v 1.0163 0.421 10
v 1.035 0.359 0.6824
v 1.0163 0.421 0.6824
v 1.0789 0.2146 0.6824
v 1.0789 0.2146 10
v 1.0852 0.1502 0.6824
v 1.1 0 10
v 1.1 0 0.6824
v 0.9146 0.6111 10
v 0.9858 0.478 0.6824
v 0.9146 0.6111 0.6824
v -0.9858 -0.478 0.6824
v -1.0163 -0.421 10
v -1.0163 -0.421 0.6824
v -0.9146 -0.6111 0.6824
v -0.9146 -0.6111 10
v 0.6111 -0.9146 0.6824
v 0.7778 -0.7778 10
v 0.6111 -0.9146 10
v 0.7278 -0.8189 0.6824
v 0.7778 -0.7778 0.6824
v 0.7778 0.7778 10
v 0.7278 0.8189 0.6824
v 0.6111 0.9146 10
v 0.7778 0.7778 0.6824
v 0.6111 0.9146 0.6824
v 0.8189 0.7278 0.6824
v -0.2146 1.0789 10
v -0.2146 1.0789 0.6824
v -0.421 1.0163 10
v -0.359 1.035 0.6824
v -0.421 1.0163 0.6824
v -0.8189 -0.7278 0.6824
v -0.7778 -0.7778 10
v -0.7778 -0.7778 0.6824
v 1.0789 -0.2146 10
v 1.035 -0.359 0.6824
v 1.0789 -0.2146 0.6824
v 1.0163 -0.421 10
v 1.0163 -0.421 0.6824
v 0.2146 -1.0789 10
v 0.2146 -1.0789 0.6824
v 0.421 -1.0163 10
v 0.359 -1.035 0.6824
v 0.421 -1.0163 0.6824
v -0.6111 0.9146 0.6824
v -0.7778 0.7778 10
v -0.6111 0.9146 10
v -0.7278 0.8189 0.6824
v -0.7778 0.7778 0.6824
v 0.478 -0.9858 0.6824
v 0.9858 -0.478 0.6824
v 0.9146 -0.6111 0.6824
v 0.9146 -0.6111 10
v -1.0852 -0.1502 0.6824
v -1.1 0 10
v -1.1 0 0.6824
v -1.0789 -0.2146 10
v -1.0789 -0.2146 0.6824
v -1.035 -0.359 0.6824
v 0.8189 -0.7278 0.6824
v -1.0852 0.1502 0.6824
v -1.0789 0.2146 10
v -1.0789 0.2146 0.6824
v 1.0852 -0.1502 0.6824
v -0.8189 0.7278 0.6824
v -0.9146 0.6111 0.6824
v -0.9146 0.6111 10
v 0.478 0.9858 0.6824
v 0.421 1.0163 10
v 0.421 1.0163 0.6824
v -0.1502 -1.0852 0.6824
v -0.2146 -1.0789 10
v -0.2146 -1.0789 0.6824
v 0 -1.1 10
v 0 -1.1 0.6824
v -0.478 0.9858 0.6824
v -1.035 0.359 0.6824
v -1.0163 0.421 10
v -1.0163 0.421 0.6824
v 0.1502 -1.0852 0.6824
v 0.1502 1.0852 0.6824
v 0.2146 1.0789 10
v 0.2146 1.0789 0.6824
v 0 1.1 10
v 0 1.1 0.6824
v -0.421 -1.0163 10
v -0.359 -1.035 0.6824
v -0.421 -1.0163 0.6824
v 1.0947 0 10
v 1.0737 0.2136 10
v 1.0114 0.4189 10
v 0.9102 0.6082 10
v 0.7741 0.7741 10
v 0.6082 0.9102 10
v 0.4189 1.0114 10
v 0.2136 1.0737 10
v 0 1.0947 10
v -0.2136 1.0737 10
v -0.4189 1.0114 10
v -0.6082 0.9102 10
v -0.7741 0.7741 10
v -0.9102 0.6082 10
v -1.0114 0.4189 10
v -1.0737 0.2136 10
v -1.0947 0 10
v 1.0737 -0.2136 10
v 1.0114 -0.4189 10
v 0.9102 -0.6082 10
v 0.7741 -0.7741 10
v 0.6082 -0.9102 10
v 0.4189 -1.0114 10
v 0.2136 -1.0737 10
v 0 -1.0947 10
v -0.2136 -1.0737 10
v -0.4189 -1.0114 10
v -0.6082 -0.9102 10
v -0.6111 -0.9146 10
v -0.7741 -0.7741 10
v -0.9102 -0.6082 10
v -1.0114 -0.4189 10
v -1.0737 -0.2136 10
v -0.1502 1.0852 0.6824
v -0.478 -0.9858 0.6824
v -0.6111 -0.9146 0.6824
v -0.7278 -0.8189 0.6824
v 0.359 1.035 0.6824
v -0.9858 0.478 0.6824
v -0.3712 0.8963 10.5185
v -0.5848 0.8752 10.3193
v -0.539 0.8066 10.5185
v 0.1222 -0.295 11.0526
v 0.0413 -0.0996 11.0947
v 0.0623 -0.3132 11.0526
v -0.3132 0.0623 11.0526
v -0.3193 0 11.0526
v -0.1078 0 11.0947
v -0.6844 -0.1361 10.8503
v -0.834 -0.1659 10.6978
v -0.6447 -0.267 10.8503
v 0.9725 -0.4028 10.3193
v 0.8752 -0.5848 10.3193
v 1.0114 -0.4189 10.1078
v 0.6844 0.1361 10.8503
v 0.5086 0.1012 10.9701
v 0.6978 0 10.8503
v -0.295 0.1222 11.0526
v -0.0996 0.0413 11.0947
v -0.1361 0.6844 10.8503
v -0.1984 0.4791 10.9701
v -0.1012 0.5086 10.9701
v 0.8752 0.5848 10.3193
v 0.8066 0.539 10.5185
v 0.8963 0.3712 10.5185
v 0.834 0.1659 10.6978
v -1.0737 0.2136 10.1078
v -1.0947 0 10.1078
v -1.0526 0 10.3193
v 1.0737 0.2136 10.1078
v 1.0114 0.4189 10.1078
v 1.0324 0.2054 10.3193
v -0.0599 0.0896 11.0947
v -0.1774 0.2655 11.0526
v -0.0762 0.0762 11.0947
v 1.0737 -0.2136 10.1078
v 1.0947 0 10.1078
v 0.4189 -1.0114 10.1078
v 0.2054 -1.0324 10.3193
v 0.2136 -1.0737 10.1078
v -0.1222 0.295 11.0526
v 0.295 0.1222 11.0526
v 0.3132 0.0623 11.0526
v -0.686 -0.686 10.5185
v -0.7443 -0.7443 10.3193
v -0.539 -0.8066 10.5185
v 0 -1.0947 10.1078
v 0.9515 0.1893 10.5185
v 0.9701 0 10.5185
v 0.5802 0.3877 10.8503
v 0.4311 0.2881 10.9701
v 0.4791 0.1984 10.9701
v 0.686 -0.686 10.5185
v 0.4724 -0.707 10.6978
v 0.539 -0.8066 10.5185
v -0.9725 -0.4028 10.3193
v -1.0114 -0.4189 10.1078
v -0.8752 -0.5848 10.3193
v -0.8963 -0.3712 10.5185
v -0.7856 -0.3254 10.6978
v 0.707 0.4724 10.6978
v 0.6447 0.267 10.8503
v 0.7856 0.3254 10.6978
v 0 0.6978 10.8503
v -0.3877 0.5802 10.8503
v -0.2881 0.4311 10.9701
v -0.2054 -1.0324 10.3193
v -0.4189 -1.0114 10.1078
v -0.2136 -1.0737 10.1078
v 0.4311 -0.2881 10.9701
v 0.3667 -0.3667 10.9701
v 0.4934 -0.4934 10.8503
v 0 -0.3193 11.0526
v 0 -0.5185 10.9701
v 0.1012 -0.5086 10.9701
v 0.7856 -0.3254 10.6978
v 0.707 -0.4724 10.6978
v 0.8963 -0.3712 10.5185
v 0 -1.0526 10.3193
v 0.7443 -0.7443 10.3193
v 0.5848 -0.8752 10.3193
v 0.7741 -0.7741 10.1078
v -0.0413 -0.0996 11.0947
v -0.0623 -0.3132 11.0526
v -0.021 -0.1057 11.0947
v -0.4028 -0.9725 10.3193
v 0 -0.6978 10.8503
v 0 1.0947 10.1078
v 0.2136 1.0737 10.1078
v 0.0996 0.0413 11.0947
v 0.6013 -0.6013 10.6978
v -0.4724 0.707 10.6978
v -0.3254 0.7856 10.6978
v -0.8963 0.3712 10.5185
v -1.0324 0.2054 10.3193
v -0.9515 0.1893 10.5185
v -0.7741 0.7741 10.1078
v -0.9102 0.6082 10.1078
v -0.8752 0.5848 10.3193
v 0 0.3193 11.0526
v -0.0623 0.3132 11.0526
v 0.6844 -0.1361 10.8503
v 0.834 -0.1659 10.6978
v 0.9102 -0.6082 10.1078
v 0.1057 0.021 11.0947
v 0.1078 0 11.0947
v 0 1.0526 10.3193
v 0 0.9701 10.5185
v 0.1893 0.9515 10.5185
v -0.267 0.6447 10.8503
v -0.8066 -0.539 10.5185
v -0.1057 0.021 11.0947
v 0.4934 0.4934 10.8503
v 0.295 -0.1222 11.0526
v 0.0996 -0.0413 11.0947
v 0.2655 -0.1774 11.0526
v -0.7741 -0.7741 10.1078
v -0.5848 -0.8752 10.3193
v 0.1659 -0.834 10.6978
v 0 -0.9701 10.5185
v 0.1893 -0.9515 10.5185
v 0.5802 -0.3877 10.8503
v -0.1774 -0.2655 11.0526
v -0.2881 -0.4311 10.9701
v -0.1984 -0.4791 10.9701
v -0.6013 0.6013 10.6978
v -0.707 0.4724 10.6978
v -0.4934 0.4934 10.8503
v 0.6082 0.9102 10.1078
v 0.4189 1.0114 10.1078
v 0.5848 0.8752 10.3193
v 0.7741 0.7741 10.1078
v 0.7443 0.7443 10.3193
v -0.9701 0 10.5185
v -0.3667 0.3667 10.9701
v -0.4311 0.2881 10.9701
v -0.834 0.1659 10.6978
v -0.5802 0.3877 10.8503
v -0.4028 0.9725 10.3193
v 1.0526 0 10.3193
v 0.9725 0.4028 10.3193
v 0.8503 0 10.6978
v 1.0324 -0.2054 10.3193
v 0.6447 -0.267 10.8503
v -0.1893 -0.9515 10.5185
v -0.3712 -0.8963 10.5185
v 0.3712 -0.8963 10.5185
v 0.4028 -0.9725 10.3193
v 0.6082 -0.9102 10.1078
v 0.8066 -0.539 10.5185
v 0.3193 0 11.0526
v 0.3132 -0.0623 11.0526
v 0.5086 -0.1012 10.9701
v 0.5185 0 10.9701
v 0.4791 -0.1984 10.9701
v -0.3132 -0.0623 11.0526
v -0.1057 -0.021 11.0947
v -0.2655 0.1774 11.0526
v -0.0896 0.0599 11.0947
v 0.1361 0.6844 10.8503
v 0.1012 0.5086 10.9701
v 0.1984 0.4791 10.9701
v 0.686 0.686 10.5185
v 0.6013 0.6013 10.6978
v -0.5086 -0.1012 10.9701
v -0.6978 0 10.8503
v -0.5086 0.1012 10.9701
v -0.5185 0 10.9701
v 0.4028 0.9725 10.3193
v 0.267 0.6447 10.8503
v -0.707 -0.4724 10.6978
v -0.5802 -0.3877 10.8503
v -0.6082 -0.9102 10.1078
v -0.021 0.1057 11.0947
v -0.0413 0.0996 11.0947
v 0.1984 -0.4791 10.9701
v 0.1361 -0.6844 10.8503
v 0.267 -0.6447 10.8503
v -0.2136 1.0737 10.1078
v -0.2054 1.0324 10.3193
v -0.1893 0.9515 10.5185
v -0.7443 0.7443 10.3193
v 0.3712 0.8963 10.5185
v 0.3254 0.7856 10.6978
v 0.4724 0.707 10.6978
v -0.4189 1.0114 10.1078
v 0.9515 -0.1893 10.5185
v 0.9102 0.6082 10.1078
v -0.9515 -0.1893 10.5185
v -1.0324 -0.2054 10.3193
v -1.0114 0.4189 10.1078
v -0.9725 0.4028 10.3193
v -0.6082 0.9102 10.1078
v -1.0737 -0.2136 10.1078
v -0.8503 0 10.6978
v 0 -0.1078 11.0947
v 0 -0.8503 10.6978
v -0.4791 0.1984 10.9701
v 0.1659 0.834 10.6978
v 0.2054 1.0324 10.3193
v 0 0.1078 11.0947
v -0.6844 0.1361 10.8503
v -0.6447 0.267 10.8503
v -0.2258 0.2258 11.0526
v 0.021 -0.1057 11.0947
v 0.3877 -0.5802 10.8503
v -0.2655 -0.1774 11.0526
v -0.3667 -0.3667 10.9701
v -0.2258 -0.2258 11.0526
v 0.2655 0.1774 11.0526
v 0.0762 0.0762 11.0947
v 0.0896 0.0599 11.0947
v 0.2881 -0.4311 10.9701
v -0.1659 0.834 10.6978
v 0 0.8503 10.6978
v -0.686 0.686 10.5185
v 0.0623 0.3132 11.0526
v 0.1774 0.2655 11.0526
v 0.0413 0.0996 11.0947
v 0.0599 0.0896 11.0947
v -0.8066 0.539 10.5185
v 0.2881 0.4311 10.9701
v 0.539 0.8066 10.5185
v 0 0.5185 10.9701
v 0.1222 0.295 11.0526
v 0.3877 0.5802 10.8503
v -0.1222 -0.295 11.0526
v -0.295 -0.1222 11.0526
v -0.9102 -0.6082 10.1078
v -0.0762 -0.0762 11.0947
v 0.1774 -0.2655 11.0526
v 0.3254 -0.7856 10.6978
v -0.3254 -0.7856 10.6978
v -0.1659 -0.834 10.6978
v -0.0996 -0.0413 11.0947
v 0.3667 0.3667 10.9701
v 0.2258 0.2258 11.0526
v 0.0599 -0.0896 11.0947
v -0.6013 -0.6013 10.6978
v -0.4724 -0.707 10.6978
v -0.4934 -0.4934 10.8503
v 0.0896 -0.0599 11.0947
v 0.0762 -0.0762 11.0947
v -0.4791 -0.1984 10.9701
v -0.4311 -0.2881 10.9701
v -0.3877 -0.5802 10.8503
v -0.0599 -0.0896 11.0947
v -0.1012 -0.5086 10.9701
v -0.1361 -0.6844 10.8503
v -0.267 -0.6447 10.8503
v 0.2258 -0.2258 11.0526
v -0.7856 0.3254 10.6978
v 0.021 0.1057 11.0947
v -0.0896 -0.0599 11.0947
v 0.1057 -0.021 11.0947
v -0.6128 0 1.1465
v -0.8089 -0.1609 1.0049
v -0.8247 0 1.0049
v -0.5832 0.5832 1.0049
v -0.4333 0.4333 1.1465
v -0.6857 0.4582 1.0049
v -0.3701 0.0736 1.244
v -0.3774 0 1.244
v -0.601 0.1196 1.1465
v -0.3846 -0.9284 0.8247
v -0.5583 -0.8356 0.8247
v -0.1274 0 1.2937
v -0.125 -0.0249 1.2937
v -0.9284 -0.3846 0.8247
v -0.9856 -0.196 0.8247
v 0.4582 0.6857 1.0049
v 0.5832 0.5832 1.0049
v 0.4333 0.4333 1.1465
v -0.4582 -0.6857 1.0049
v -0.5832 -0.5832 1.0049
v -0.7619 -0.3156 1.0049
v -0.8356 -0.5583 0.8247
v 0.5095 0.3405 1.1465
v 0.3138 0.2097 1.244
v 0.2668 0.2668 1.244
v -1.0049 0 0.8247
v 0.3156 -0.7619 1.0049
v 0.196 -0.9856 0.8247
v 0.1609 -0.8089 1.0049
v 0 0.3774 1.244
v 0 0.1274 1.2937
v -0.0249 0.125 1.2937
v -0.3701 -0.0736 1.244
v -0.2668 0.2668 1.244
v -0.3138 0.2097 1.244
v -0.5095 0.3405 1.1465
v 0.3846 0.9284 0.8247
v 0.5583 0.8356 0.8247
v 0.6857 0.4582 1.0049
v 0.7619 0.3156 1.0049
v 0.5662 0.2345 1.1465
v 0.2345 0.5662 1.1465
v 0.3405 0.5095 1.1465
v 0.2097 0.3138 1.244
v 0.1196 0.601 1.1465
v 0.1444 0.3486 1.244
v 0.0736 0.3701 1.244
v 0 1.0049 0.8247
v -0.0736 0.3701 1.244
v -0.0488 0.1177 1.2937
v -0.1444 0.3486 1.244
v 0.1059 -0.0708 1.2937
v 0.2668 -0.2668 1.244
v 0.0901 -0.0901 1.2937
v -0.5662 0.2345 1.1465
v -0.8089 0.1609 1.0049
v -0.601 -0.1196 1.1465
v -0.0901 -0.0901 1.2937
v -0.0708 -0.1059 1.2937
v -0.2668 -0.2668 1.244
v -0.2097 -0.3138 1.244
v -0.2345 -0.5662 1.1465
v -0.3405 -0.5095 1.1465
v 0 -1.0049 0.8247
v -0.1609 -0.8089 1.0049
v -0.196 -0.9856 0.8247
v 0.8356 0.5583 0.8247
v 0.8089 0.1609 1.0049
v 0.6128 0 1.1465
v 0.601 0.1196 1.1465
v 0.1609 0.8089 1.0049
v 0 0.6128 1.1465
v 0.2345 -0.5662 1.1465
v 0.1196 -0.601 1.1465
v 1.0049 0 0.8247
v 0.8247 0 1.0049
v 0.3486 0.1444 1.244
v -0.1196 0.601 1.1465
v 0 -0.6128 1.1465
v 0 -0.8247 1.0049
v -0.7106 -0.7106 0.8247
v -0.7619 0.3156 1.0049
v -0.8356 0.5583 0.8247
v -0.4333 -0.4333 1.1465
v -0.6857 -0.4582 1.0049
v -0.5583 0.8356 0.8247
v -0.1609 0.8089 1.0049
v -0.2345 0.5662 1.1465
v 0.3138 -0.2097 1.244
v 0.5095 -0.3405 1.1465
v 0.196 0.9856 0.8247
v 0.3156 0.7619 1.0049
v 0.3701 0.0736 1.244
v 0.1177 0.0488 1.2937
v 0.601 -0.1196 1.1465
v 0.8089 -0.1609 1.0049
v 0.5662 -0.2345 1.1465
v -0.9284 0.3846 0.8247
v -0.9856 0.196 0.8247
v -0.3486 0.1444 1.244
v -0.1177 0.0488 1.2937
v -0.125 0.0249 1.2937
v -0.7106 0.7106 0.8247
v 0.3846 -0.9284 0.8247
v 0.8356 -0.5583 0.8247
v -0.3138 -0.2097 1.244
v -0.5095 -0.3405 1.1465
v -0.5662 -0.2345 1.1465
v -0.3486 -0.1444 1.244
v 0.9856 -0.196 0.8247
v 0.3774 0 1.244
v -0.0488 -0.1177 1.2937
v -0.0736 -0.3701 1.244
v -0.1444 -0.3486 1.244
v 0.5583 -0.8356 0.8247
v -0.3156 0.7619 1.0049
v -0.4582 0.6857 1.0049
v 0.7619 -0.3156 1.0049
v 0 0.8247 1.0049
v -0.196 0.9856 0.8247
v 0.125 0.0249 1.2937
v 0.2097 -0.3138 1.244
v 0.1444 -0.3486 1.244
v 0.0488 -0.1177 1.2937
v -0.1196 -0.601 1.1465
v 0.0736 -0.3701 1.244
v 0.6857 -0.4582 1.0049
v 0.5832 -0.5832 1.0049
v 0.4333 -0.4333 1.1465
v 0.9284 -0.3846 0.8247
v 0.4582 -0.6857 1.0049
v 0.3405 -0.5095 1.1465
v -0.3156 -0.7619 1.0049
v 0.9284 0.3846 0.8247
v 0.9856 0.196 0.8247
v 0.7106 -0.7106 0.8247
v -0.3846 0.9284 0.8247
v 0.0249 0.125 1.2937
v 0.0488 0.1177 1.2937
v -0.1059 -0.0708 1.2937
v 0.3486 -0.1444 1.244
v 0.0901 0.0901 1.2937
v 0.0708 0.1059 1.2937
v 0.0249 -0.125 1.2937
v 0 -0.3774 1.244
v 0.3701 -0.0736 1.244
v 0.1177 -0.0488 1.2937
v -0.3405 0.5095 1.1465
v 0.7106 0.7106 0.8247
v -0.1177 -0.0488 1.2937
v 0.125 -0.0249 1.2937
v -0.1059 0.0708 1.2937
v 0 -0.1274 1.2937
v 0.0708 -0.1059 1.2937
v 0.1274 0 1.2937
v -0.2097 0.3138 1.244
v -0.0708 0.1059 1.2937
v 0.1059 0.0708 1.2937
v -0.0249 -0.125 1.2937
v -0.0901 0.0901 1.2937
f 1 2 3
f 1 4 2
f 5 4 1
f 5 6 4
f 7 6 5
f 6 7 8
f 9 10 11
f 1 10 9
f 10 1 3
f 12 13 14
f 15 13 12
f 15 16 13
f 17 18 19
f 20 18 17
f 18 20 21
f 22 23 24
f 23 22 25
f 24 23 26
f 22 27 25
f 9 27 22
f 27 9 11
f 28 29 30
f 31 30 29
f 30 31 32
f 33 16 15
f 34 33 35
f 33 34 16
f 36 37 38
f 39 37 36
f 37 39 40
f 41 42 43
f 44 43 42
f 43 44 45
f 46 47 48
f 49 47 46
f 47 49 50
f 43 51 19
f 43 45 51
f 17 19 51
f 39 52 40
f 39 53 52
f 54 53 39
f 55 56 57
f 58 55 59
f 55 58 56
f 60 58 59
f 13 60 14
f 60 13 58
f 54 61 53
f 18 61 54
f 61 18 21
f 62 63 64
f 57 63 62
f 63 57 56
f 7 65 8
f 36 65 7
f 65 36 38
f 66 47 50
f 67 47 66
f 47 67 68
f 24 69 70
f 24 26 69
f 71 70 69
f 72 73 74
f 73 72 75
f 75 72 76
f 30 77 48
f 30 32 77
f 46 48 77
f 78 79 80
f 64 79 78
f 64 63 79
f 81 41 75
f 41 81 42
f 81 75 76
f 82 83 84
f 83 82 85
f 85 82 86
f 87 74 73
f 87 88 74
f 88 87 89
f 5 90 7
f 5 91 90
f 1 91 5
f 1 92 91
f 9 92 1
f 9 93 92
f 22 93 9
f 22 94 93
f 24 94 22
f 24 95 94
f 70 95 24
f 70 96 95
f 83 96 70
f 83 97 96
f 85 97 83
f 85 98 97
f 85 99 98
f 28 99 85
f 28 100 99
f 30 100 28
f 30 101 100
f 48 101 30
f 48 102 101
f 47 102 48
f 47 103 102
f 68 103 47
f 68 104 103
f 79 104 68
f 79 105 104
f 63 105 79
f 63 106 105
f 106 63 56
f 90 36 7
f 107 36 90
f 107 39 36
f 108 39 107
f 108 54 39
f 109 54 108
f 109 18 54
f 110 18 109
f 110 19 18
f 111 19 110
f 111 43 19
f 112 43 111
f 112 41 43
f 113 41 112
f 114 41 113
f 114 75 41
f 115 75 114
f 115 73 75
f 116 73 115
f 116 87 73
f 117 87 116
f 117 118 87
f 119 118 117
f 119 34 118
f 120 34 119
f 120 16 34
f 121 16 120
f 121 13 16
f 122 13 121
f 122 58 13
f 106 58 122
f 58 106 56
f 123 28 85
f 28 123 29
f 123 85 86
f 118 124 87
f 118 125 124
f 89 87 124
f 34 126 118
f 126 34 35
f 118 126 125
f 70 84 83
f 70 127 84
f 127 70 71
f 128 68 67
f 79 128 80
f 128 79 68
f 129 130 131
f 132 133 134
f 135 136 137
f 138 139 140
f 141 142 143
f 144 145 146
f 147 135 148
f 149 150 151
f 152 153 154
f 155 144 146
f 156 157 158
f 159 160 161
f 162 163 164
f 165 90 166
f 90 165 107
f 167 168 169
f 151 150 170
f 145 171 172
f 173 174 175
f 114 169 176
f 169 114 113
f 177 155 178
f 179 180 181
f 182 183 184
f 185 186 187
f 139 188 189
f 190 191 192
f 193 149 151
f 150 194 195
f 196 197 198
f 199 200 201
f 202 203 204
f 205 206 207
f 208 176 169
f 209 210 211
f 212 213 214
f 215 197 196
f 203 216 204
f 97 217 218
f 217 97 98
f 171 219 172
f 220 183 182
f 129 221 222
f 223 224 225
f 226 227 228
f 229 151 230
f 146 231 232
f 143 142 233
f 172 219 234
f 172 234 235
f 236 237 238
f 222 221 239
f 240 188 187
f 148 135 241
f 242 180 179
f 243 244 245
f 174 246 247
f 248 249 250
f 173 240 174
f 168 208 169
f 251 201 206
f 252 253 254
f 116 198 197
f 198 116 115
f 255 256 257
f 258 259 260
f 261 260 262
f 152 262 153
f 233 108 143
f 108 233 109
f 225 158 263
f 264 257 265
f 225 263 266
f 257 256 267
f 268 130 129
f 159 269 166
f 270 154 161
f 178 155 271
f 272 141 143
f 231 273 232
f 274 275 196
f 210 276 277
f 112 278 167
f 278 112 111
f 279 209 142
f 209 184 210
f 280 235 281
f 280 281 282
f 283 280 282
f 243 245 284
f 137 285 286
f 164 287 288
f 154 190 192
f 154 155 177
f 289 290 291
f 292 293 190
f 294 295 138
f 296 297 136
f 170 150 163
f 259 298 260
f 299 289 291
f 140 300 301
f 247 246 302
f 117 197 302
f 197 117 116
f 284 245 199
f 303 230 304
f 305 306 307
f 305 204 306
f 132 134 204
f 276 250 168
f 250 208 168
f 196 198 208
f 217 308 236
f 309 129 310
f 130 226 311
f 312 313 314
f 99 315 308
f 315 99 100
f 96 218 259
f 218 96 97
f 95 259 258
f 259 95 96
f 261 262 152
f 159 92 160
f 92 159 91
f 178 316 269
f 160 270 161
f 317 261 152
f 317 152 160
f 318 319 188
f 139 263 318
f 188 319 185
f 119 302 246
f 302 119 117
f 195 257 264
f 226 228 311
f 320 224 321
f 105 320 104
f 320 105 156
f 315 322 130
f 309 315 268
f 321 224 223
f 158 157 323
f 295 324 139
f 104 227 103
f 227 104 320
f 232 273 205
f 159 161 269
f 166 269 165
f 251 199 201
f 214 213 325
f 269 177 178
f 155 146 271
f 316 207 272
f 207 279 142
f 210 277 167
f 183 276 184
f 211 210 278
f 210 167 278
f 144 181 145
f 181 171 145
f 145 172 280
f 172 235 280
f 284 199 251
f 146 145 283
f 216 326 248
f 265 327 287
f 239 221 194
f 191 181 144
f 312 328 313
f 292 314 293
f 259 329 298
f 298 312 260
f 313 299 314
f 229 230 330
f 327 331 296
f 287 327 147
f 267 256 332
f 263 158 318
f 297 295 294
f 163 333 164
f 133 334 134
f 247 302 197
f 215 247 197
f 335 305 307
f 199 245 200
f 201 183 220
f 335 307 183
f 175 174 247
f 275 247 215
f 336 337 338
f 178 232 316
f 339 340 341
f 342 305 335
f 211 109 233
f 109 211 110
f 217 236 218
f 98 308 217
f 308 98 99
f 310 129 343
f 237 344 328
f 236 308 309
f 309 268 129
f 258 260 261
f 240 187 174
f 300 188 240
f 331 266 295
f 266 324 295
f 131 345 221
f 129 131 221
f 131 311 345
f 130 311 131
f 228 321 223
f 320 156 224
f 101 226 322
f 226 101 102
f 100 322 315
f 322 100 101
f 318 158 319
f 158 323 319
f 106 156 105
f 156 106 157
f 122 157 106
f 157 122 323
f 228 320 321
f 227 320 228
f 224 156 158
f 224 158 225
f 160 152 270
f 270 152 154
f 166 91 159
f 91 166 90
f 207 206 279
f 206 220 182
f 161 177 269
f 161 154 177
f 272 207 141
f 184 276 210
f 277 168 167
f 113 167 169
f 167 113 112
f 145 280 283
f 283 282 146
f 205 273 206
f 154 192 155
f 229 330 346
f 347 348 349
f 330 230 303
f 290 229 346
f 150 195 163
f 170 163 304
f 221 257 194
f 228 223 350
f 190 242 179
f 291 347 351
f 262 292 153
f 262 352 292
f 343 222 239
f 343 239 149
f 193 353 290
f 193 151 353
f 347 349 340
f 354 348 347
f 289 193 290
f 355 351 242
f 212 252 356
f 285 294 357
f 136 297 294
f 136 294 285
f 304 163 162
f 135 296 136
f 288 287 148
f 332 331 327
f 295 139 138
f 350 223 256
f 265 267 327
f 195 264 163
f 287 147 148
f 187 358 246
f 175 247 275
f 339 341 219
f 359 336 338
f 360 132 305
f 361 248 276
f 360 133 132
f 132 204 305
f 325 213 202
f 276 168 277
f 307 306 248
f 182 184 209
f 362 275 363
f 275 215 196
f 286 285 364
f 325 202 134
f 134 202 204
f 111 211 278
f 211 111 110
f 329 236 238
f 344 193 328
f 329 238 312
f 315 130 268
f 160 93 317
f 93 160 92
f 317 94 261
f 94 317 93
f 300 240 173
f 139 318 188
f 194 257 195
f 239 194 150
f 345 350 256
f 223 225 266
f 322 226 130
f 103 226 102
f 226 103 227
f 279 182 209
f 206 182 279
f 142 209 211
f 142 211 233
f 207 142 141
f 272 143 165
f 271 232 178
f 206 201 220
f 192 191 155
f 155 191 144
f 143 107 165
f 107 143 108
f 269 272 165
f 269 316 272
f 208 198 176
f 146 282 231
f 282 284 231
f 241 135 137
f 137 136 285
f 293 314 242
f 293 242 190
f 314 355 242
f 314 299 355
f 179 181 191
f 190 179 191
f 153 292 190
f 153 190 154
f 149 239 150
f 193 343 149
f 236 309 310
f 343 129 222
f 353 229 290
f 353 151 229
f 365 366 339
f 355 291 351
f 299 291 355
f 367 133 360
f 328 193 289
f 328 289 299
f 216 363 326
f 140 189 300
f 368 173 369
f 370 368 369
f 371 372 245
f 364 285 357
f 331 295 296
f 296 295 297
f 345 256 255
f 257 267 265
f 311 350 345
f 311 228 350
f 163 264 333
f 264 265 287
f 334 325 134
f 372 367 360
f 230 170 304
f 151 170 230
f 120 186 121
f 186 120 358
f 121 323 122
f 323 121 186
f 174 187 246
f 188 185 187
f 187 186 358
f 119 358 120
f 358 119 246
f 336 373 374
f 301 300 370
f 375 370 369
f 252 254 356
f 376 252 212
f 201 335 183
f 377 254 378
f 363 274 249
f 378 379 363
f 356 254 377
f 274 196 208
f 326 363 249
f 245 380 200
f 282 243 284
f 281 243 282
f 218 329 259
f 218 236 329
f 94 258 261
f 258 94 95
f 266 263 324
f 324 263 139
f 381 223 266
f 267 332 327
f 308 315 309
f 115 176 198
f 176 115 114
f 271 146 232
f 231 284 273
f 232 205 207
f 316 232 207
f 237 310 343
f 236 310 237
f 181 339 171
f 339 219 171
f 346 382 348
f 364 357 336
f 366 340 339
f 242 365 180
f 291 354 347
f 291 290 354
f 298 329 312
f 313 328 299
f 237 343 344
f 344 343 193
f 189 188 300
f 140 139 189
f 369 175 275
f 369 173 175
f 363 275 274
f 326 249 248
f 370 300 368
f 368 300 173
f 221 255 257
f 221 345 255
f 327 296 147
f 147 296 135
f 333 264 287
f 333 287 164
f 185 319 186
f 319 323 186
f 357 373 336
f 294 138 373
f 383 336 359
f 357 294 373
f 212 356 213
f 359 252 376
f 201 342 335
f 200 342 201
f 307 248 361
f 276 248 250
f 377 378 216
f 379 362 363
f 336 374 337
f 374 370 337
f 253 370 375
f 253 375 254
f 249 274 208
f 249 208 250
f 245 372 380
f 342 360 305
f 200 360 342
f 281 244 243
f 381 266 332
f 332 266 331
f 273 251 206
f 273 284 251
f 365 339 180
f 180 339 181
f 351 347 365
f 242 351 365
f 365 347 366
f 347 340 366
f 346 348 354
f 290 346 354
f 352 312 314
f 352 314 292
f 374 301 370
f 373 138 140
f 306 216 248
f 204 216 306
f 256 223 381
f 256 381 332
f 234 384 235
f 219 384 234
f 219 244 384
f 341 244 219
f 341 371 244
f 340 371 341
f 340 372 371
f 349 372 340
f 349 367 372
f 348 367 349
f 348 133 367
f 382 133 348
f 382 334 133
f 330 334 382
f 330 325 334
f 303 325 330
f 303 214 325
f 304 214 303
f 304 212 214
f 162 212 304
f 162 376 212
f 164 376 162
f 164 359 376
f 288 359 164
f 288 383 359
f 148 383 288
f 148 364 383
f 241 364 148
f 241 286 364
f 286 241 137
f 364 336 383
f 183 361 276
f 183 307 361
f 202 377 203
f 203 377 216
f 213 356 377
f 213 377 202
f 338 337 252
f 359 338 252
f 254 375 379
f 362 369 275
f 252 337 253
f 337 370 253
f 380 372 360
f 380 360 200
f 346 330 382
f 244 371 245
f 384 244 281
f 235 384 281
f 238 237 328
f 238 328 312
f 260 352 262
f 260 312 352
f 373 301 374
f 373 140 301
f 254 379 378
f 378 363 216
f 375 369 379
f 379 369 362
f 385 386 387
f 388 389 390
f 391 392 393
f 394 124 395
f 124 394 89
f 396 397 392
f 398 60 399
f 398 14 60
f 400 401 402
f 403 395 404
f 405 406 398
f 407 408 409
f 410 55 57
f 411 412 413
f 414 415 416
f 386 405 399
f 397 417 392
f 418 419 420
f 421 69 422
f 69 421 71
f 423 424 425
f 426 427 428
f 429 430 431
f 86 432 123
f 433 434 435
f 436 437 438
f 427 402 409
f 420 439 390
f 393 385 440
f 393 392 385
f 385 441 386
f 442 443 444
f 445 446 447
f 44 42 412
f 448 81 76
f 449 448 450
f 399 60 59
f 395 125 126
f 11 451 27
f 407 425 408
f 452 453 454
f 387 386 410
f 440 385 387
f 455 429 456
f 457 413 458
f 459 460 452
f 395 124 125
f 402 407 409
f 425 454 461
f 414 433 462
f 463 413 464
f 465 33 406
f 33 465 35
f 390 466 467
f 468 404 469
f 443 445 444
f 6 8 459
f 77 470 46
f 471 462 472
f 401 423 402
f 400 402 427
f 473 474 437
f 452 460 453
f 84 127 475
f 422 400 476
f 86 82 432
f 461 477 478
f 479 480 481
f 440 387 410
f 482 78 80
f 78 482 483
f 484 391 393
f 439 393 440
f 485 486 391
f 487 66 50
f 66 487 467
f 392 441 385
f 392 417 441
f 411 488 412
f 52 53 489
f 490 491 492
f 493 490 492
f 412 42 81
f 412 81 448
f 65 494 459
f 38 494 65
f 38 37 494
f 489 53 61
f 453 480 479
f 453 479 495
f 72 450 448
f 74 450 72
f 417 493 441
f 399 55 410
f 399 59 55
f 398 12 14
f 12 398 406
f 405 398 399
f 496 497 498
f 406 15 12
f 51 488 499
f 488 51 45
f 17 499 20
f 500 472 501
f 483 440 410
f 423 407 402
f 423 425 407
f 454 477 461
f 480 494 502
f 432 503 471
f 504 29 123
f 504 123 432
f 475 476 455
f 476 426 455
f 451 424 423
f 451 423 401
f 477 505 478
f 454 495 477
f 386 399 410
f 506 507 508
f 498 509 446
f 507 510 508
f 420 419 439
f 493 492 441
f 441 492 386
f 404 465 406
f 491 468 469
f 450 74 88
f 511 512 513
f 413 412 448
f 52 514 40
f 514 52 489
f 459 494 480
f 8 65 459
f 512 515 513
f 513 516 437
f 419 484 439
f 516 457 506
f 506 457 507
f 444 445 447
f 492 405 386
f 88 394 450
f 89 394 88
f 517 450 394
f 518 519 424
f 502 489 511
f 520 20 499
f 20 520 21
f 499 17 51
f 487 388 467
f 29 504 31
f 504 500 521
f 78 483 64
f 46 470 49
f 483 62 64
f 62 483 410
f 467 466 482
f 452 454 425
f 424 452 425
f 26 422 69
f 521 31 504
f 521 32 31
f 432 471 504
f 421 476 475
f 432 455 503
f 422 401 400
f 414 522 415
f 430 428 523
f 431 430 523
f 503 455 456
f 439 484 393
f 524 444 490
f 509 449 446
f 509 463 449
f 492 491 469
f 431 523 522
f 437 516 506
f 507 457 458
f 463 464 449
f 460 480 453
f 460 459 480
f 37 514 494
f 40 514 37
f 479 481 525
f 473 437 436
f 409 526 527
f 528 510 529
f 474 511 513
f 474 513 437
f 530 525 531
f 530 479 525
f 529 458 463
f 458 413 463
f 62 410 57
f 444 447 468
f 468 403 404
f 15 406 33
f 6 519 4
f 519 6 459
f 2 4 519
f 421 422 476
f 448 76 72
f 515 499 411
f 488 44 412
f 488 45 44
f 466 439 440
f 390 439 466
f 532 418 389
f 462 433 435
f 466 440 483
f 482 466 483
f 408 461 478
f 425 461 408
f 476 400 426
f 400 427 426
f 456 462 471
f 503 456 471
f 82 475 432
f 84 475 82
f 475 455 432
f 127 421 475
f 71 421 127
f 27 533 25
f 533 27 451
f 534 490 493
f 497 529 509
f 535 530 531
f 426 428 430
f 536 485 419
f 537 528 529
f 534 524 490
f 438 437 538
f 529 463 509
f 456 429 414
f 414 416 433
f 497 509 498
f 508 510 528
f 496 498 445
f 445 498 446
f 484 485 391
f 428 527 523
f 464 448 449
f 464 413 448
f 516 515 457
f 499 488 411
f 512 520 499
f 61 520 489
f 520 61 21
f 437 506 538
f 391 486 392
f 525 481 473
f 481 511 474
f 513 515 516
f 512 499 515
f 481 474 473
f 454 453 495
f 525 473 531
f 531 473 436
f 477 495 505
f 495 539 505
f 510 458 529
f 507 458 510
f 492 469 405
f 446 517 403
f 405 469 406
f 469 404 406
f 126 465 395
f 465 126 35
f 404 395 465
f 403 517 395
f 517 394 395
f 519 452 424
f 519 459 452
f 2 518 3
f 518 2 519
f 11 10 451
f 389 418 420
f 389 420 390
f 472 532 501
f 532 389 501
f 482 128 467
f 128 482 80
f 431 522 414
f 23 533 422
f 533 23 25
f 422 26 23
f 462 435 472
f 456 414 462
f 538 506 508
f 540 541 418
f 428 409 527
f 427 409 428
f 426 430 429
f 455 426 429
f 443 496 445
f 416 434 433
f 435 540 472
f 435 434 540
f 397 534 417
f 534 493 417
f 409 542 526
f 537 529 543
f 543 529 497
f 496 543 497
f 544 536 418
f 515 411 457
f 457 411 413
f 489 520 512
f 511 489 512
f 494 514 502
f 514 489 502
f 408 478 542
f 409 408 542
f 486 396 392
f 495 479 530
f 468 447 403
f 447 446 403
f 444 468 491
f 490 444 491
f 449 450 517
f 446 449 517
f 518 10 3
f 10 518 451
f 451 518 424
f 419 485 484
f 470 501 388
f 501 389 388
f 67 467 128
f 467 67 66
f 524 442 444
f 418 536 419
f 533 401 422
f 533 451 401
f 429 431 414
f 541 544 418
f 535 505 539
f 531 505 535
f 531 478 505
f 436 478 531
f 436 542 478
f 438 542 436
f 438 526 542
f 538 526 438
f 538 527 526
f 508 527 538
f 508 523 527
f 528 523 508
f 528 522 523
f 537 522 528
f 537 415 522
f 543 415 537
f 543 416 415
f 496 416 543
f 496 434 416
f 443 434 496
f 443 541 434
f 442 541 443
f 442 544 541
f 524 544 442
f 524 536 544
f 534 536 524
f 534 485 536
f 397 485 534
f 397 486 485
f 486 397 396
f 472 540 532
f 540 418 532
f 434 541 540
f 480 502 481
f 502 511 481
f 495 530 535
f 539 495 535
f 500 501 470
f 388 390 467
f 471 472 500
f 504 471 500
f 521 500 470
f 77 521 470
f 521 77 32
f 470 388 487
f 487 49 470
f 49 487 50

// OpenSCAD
// ==============================================================================
// 🤖 ARTICULATED ROBOT COMPONENT GENERATOR
// ==============================================================================
$fn = 32;

// Choose which specific part to render for export:
// "TRUNK_SEGMENT", "PROBOSCIS", "COXA", "FEMUR", "TIBIA"
part_type = "FEMUR"; 

// Dimensions
radius = 1.0;
length_femur = 10.0;
length_tibia = 9.0;
length_coxa = 2.5;

module joint_socket() {
    // Spherical indentation to represent a physical mechanical joint pivot
    sphere(r = radius * 1.3);
}

module joint_ball(len) {
    // Ball hinge tip at the distal end of the limb segment
    translate([0, 0, len])
        sphere(r = radius * 1.1);
}

// Render Engine Logic
if (part_type == "TRUNK_SEGMENT") {
    difference() {
        union() {
            cylinder(h = 4.0, r = 2.0, center = true);
            // Left & Right Lateral Hinge Extenders
            rotate([0, 90, 0]) cylinder(h = 6.0, r = 1.2, center = true);
        }
        // Hollow sockets out the sides for the Coxa joints
        translate([3.0, 0, 0]) joint_socket();
        translate([-3.0, 0, 0]) joint_socket();
    }
}

if (part_type == "PROBOSCIS") {
    union() {
        cylinder(h = 7.0, r1 = 1.8, r2 = 1.2, center = false);
        joint_ball(7.0);
    }
}

if (part_type == "COXA") {
    difference() {
        union() {
            cylinder(h = length_coxa, r = radius * 1.3);
            joint_ball(length_coxa);
        }
        joint_socket(); // Proximal socket attachment
    }
}

if (part_type == "FEMUR") {
    difference() {
        union() {
            cylinder(h = length_femur, r = radius * 1.1);
            joint_ball(length_femur);
        }
        joint_socket();
    }
}

if (part_type == "TIBIA") {
    difference() {
        union() {
            cylinder(h = length_tibia, r = radius * 0.9);
            joint_ball(length_tibia);
        }
        joint_socket();
    }
}
